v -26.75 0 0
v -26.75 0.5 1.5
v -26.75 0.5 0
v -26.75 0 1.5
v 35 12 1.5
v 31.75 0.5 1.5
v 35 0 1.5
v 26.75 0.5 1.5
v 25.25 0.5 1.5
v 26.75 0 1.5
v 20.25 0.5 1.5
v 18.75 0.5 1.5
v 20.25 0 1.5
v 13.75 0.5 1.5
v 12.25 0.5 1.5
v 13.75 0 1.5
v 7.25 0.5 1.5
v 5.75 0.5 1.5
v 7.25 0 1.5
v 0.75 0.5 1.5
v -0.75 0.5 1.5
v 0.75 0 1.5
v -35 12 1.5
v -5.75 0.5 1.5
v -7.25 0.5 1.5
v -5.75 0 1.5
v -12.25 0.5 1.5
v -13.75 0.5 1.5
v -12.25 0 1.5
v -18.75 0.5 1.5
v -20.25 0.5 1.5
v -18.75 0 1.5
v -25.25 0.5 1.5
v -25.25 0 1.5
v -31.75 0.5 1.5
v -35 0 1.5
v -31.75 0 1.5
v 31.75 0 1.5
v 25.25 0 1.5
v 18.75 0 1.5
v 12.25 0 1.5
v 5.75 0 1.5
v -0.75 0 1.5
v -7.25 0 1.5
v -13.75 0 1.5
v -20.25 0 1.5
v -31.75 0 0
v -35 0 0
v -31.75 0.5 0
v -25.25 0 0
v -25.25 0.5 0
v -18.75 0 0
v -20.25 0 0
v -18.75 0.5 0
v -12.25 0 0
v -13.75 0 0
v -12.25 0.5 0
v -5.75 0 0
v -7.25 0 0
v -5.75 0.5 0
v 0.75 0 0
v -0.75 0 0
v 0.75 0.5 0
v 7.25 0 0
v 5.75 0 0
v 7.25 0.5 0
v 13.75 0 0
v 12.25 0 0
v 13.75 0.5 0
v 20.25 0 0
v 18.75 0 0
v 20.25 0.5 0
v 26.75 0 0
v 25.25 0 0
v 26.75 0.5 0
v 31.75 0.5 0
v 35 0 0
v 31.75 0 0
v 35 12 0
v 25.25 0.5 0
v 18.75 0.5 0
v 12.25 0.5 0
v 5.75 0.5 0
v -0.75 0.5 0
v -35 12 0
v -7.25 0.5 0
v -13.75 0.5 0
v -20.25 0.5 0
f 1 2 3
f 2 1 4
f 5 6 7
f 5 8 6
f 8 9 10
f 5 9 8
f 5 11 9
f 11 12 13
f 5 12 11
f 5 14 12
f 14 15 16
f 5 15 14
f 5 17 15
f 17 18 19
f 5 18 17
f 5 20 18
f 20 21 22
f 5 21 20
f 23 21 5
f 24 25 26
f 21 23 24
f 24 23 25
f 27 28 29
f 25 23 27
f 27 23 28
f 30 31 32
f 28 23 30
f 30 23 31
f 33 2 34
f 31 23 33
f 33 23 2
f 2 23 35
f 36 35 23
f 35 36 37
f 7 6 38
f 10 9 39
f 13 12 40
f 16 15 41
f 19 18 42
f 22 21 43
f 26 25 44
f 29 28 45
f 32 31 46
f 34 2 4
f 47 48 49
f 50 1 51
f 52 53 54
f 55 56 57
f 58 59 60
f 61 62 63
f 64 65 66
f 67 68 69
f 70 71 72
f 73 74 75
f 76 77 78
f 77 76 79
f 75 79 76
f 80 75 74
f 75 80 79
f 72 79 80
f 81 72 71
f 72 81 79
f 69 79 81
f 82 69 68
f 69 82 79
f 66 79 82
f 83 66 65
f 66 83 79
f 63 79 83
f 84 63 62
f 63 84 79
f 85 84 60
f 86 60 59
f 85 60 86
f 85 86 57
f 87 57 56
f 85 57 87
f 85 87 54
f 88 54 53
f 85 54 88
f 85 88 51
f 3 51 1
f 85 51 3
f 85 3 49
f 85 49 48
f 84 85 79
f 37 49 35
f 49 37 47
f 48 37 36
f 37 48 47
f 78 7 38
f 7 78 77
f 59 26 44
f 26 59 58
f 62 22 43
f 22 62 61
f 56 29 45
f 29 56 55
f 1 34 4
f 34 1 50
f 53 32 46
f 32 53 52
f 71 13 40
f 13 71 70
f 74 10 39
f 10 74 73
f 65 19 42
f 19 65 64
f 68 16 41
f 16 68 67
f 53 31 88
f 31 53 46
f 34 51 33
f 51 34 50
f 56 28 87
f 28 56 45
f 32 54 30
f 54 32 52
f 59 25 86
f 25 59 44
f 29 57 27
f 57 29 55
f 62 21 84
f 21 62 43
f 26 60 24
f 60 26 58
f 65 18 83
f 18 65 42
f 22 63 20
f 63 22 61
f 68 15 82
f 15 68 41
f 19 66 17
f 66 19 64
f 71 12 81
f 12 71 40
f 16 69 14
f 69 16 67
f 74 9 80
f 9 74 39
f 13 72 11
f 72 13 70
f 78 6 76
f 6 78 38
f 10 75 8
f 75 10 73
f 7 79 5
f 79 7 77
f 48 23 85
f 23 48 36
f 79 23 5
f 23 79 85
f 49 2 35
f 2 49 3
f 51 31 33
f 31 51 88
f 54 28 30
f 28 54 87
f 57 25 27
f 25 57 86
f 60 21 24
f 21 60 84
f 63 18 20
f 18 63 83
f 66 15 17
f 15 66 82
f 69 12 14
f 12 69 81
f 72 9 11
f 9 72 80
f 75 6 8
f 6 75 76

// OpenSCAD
// 10-well agarose gel comb, printed lying flat
// Units: mm

// ---------- Parameters ----------
plate_t      = 1.5;   // plate thickness (Z)
spine_len    = 70;    // spine length along X
spine_w      = 12;    // spine width along Y
tooth_n      = 10;    // number of teeth
tooth_w      = 5.0;   // tooth width along X
tooth_len    = 12;    // tooth length along Y (hangs from spine)
tooth_gap    = 1.5;   // gap between neighbouring teeth along X
eps          = 0.5;   // cutter overshoot past faces

$fn = 64;

// ---------- Derived ----------
pitch   = tooth_w + tooth_gap;            // centre-to-centre spacing
x0      = -(tooth_n - 1) * pitch / 2;     // first tooth centre (row centred)

// ---------- Model ----------
difference() {
    union() {
        // Spine (back bar)
        translate([-spine_len / 2, 0, 0])
            cube([spine_len, spine_w, plate_t]);

        // Teeth hanging from -Y edge of spine
        for (i = [0 : tooth_n - 1])
            translate([x0 + i * pitch - tooth_w / 2, -tooth_len, 0])
                cube([tooth_w, tooth_len, plate_t]);
    }

    // Through-cut each tooth (extends past top and bottom faces)
    for (i = [0 : tooth_n - 1])
        translate([x0 + i * pitch - tooth_w / 2, -tooth_len - eps, -eps])
            cube([tooth_w, tooth_len + 2 * eps, plate_t + 2 * eps]);
}
